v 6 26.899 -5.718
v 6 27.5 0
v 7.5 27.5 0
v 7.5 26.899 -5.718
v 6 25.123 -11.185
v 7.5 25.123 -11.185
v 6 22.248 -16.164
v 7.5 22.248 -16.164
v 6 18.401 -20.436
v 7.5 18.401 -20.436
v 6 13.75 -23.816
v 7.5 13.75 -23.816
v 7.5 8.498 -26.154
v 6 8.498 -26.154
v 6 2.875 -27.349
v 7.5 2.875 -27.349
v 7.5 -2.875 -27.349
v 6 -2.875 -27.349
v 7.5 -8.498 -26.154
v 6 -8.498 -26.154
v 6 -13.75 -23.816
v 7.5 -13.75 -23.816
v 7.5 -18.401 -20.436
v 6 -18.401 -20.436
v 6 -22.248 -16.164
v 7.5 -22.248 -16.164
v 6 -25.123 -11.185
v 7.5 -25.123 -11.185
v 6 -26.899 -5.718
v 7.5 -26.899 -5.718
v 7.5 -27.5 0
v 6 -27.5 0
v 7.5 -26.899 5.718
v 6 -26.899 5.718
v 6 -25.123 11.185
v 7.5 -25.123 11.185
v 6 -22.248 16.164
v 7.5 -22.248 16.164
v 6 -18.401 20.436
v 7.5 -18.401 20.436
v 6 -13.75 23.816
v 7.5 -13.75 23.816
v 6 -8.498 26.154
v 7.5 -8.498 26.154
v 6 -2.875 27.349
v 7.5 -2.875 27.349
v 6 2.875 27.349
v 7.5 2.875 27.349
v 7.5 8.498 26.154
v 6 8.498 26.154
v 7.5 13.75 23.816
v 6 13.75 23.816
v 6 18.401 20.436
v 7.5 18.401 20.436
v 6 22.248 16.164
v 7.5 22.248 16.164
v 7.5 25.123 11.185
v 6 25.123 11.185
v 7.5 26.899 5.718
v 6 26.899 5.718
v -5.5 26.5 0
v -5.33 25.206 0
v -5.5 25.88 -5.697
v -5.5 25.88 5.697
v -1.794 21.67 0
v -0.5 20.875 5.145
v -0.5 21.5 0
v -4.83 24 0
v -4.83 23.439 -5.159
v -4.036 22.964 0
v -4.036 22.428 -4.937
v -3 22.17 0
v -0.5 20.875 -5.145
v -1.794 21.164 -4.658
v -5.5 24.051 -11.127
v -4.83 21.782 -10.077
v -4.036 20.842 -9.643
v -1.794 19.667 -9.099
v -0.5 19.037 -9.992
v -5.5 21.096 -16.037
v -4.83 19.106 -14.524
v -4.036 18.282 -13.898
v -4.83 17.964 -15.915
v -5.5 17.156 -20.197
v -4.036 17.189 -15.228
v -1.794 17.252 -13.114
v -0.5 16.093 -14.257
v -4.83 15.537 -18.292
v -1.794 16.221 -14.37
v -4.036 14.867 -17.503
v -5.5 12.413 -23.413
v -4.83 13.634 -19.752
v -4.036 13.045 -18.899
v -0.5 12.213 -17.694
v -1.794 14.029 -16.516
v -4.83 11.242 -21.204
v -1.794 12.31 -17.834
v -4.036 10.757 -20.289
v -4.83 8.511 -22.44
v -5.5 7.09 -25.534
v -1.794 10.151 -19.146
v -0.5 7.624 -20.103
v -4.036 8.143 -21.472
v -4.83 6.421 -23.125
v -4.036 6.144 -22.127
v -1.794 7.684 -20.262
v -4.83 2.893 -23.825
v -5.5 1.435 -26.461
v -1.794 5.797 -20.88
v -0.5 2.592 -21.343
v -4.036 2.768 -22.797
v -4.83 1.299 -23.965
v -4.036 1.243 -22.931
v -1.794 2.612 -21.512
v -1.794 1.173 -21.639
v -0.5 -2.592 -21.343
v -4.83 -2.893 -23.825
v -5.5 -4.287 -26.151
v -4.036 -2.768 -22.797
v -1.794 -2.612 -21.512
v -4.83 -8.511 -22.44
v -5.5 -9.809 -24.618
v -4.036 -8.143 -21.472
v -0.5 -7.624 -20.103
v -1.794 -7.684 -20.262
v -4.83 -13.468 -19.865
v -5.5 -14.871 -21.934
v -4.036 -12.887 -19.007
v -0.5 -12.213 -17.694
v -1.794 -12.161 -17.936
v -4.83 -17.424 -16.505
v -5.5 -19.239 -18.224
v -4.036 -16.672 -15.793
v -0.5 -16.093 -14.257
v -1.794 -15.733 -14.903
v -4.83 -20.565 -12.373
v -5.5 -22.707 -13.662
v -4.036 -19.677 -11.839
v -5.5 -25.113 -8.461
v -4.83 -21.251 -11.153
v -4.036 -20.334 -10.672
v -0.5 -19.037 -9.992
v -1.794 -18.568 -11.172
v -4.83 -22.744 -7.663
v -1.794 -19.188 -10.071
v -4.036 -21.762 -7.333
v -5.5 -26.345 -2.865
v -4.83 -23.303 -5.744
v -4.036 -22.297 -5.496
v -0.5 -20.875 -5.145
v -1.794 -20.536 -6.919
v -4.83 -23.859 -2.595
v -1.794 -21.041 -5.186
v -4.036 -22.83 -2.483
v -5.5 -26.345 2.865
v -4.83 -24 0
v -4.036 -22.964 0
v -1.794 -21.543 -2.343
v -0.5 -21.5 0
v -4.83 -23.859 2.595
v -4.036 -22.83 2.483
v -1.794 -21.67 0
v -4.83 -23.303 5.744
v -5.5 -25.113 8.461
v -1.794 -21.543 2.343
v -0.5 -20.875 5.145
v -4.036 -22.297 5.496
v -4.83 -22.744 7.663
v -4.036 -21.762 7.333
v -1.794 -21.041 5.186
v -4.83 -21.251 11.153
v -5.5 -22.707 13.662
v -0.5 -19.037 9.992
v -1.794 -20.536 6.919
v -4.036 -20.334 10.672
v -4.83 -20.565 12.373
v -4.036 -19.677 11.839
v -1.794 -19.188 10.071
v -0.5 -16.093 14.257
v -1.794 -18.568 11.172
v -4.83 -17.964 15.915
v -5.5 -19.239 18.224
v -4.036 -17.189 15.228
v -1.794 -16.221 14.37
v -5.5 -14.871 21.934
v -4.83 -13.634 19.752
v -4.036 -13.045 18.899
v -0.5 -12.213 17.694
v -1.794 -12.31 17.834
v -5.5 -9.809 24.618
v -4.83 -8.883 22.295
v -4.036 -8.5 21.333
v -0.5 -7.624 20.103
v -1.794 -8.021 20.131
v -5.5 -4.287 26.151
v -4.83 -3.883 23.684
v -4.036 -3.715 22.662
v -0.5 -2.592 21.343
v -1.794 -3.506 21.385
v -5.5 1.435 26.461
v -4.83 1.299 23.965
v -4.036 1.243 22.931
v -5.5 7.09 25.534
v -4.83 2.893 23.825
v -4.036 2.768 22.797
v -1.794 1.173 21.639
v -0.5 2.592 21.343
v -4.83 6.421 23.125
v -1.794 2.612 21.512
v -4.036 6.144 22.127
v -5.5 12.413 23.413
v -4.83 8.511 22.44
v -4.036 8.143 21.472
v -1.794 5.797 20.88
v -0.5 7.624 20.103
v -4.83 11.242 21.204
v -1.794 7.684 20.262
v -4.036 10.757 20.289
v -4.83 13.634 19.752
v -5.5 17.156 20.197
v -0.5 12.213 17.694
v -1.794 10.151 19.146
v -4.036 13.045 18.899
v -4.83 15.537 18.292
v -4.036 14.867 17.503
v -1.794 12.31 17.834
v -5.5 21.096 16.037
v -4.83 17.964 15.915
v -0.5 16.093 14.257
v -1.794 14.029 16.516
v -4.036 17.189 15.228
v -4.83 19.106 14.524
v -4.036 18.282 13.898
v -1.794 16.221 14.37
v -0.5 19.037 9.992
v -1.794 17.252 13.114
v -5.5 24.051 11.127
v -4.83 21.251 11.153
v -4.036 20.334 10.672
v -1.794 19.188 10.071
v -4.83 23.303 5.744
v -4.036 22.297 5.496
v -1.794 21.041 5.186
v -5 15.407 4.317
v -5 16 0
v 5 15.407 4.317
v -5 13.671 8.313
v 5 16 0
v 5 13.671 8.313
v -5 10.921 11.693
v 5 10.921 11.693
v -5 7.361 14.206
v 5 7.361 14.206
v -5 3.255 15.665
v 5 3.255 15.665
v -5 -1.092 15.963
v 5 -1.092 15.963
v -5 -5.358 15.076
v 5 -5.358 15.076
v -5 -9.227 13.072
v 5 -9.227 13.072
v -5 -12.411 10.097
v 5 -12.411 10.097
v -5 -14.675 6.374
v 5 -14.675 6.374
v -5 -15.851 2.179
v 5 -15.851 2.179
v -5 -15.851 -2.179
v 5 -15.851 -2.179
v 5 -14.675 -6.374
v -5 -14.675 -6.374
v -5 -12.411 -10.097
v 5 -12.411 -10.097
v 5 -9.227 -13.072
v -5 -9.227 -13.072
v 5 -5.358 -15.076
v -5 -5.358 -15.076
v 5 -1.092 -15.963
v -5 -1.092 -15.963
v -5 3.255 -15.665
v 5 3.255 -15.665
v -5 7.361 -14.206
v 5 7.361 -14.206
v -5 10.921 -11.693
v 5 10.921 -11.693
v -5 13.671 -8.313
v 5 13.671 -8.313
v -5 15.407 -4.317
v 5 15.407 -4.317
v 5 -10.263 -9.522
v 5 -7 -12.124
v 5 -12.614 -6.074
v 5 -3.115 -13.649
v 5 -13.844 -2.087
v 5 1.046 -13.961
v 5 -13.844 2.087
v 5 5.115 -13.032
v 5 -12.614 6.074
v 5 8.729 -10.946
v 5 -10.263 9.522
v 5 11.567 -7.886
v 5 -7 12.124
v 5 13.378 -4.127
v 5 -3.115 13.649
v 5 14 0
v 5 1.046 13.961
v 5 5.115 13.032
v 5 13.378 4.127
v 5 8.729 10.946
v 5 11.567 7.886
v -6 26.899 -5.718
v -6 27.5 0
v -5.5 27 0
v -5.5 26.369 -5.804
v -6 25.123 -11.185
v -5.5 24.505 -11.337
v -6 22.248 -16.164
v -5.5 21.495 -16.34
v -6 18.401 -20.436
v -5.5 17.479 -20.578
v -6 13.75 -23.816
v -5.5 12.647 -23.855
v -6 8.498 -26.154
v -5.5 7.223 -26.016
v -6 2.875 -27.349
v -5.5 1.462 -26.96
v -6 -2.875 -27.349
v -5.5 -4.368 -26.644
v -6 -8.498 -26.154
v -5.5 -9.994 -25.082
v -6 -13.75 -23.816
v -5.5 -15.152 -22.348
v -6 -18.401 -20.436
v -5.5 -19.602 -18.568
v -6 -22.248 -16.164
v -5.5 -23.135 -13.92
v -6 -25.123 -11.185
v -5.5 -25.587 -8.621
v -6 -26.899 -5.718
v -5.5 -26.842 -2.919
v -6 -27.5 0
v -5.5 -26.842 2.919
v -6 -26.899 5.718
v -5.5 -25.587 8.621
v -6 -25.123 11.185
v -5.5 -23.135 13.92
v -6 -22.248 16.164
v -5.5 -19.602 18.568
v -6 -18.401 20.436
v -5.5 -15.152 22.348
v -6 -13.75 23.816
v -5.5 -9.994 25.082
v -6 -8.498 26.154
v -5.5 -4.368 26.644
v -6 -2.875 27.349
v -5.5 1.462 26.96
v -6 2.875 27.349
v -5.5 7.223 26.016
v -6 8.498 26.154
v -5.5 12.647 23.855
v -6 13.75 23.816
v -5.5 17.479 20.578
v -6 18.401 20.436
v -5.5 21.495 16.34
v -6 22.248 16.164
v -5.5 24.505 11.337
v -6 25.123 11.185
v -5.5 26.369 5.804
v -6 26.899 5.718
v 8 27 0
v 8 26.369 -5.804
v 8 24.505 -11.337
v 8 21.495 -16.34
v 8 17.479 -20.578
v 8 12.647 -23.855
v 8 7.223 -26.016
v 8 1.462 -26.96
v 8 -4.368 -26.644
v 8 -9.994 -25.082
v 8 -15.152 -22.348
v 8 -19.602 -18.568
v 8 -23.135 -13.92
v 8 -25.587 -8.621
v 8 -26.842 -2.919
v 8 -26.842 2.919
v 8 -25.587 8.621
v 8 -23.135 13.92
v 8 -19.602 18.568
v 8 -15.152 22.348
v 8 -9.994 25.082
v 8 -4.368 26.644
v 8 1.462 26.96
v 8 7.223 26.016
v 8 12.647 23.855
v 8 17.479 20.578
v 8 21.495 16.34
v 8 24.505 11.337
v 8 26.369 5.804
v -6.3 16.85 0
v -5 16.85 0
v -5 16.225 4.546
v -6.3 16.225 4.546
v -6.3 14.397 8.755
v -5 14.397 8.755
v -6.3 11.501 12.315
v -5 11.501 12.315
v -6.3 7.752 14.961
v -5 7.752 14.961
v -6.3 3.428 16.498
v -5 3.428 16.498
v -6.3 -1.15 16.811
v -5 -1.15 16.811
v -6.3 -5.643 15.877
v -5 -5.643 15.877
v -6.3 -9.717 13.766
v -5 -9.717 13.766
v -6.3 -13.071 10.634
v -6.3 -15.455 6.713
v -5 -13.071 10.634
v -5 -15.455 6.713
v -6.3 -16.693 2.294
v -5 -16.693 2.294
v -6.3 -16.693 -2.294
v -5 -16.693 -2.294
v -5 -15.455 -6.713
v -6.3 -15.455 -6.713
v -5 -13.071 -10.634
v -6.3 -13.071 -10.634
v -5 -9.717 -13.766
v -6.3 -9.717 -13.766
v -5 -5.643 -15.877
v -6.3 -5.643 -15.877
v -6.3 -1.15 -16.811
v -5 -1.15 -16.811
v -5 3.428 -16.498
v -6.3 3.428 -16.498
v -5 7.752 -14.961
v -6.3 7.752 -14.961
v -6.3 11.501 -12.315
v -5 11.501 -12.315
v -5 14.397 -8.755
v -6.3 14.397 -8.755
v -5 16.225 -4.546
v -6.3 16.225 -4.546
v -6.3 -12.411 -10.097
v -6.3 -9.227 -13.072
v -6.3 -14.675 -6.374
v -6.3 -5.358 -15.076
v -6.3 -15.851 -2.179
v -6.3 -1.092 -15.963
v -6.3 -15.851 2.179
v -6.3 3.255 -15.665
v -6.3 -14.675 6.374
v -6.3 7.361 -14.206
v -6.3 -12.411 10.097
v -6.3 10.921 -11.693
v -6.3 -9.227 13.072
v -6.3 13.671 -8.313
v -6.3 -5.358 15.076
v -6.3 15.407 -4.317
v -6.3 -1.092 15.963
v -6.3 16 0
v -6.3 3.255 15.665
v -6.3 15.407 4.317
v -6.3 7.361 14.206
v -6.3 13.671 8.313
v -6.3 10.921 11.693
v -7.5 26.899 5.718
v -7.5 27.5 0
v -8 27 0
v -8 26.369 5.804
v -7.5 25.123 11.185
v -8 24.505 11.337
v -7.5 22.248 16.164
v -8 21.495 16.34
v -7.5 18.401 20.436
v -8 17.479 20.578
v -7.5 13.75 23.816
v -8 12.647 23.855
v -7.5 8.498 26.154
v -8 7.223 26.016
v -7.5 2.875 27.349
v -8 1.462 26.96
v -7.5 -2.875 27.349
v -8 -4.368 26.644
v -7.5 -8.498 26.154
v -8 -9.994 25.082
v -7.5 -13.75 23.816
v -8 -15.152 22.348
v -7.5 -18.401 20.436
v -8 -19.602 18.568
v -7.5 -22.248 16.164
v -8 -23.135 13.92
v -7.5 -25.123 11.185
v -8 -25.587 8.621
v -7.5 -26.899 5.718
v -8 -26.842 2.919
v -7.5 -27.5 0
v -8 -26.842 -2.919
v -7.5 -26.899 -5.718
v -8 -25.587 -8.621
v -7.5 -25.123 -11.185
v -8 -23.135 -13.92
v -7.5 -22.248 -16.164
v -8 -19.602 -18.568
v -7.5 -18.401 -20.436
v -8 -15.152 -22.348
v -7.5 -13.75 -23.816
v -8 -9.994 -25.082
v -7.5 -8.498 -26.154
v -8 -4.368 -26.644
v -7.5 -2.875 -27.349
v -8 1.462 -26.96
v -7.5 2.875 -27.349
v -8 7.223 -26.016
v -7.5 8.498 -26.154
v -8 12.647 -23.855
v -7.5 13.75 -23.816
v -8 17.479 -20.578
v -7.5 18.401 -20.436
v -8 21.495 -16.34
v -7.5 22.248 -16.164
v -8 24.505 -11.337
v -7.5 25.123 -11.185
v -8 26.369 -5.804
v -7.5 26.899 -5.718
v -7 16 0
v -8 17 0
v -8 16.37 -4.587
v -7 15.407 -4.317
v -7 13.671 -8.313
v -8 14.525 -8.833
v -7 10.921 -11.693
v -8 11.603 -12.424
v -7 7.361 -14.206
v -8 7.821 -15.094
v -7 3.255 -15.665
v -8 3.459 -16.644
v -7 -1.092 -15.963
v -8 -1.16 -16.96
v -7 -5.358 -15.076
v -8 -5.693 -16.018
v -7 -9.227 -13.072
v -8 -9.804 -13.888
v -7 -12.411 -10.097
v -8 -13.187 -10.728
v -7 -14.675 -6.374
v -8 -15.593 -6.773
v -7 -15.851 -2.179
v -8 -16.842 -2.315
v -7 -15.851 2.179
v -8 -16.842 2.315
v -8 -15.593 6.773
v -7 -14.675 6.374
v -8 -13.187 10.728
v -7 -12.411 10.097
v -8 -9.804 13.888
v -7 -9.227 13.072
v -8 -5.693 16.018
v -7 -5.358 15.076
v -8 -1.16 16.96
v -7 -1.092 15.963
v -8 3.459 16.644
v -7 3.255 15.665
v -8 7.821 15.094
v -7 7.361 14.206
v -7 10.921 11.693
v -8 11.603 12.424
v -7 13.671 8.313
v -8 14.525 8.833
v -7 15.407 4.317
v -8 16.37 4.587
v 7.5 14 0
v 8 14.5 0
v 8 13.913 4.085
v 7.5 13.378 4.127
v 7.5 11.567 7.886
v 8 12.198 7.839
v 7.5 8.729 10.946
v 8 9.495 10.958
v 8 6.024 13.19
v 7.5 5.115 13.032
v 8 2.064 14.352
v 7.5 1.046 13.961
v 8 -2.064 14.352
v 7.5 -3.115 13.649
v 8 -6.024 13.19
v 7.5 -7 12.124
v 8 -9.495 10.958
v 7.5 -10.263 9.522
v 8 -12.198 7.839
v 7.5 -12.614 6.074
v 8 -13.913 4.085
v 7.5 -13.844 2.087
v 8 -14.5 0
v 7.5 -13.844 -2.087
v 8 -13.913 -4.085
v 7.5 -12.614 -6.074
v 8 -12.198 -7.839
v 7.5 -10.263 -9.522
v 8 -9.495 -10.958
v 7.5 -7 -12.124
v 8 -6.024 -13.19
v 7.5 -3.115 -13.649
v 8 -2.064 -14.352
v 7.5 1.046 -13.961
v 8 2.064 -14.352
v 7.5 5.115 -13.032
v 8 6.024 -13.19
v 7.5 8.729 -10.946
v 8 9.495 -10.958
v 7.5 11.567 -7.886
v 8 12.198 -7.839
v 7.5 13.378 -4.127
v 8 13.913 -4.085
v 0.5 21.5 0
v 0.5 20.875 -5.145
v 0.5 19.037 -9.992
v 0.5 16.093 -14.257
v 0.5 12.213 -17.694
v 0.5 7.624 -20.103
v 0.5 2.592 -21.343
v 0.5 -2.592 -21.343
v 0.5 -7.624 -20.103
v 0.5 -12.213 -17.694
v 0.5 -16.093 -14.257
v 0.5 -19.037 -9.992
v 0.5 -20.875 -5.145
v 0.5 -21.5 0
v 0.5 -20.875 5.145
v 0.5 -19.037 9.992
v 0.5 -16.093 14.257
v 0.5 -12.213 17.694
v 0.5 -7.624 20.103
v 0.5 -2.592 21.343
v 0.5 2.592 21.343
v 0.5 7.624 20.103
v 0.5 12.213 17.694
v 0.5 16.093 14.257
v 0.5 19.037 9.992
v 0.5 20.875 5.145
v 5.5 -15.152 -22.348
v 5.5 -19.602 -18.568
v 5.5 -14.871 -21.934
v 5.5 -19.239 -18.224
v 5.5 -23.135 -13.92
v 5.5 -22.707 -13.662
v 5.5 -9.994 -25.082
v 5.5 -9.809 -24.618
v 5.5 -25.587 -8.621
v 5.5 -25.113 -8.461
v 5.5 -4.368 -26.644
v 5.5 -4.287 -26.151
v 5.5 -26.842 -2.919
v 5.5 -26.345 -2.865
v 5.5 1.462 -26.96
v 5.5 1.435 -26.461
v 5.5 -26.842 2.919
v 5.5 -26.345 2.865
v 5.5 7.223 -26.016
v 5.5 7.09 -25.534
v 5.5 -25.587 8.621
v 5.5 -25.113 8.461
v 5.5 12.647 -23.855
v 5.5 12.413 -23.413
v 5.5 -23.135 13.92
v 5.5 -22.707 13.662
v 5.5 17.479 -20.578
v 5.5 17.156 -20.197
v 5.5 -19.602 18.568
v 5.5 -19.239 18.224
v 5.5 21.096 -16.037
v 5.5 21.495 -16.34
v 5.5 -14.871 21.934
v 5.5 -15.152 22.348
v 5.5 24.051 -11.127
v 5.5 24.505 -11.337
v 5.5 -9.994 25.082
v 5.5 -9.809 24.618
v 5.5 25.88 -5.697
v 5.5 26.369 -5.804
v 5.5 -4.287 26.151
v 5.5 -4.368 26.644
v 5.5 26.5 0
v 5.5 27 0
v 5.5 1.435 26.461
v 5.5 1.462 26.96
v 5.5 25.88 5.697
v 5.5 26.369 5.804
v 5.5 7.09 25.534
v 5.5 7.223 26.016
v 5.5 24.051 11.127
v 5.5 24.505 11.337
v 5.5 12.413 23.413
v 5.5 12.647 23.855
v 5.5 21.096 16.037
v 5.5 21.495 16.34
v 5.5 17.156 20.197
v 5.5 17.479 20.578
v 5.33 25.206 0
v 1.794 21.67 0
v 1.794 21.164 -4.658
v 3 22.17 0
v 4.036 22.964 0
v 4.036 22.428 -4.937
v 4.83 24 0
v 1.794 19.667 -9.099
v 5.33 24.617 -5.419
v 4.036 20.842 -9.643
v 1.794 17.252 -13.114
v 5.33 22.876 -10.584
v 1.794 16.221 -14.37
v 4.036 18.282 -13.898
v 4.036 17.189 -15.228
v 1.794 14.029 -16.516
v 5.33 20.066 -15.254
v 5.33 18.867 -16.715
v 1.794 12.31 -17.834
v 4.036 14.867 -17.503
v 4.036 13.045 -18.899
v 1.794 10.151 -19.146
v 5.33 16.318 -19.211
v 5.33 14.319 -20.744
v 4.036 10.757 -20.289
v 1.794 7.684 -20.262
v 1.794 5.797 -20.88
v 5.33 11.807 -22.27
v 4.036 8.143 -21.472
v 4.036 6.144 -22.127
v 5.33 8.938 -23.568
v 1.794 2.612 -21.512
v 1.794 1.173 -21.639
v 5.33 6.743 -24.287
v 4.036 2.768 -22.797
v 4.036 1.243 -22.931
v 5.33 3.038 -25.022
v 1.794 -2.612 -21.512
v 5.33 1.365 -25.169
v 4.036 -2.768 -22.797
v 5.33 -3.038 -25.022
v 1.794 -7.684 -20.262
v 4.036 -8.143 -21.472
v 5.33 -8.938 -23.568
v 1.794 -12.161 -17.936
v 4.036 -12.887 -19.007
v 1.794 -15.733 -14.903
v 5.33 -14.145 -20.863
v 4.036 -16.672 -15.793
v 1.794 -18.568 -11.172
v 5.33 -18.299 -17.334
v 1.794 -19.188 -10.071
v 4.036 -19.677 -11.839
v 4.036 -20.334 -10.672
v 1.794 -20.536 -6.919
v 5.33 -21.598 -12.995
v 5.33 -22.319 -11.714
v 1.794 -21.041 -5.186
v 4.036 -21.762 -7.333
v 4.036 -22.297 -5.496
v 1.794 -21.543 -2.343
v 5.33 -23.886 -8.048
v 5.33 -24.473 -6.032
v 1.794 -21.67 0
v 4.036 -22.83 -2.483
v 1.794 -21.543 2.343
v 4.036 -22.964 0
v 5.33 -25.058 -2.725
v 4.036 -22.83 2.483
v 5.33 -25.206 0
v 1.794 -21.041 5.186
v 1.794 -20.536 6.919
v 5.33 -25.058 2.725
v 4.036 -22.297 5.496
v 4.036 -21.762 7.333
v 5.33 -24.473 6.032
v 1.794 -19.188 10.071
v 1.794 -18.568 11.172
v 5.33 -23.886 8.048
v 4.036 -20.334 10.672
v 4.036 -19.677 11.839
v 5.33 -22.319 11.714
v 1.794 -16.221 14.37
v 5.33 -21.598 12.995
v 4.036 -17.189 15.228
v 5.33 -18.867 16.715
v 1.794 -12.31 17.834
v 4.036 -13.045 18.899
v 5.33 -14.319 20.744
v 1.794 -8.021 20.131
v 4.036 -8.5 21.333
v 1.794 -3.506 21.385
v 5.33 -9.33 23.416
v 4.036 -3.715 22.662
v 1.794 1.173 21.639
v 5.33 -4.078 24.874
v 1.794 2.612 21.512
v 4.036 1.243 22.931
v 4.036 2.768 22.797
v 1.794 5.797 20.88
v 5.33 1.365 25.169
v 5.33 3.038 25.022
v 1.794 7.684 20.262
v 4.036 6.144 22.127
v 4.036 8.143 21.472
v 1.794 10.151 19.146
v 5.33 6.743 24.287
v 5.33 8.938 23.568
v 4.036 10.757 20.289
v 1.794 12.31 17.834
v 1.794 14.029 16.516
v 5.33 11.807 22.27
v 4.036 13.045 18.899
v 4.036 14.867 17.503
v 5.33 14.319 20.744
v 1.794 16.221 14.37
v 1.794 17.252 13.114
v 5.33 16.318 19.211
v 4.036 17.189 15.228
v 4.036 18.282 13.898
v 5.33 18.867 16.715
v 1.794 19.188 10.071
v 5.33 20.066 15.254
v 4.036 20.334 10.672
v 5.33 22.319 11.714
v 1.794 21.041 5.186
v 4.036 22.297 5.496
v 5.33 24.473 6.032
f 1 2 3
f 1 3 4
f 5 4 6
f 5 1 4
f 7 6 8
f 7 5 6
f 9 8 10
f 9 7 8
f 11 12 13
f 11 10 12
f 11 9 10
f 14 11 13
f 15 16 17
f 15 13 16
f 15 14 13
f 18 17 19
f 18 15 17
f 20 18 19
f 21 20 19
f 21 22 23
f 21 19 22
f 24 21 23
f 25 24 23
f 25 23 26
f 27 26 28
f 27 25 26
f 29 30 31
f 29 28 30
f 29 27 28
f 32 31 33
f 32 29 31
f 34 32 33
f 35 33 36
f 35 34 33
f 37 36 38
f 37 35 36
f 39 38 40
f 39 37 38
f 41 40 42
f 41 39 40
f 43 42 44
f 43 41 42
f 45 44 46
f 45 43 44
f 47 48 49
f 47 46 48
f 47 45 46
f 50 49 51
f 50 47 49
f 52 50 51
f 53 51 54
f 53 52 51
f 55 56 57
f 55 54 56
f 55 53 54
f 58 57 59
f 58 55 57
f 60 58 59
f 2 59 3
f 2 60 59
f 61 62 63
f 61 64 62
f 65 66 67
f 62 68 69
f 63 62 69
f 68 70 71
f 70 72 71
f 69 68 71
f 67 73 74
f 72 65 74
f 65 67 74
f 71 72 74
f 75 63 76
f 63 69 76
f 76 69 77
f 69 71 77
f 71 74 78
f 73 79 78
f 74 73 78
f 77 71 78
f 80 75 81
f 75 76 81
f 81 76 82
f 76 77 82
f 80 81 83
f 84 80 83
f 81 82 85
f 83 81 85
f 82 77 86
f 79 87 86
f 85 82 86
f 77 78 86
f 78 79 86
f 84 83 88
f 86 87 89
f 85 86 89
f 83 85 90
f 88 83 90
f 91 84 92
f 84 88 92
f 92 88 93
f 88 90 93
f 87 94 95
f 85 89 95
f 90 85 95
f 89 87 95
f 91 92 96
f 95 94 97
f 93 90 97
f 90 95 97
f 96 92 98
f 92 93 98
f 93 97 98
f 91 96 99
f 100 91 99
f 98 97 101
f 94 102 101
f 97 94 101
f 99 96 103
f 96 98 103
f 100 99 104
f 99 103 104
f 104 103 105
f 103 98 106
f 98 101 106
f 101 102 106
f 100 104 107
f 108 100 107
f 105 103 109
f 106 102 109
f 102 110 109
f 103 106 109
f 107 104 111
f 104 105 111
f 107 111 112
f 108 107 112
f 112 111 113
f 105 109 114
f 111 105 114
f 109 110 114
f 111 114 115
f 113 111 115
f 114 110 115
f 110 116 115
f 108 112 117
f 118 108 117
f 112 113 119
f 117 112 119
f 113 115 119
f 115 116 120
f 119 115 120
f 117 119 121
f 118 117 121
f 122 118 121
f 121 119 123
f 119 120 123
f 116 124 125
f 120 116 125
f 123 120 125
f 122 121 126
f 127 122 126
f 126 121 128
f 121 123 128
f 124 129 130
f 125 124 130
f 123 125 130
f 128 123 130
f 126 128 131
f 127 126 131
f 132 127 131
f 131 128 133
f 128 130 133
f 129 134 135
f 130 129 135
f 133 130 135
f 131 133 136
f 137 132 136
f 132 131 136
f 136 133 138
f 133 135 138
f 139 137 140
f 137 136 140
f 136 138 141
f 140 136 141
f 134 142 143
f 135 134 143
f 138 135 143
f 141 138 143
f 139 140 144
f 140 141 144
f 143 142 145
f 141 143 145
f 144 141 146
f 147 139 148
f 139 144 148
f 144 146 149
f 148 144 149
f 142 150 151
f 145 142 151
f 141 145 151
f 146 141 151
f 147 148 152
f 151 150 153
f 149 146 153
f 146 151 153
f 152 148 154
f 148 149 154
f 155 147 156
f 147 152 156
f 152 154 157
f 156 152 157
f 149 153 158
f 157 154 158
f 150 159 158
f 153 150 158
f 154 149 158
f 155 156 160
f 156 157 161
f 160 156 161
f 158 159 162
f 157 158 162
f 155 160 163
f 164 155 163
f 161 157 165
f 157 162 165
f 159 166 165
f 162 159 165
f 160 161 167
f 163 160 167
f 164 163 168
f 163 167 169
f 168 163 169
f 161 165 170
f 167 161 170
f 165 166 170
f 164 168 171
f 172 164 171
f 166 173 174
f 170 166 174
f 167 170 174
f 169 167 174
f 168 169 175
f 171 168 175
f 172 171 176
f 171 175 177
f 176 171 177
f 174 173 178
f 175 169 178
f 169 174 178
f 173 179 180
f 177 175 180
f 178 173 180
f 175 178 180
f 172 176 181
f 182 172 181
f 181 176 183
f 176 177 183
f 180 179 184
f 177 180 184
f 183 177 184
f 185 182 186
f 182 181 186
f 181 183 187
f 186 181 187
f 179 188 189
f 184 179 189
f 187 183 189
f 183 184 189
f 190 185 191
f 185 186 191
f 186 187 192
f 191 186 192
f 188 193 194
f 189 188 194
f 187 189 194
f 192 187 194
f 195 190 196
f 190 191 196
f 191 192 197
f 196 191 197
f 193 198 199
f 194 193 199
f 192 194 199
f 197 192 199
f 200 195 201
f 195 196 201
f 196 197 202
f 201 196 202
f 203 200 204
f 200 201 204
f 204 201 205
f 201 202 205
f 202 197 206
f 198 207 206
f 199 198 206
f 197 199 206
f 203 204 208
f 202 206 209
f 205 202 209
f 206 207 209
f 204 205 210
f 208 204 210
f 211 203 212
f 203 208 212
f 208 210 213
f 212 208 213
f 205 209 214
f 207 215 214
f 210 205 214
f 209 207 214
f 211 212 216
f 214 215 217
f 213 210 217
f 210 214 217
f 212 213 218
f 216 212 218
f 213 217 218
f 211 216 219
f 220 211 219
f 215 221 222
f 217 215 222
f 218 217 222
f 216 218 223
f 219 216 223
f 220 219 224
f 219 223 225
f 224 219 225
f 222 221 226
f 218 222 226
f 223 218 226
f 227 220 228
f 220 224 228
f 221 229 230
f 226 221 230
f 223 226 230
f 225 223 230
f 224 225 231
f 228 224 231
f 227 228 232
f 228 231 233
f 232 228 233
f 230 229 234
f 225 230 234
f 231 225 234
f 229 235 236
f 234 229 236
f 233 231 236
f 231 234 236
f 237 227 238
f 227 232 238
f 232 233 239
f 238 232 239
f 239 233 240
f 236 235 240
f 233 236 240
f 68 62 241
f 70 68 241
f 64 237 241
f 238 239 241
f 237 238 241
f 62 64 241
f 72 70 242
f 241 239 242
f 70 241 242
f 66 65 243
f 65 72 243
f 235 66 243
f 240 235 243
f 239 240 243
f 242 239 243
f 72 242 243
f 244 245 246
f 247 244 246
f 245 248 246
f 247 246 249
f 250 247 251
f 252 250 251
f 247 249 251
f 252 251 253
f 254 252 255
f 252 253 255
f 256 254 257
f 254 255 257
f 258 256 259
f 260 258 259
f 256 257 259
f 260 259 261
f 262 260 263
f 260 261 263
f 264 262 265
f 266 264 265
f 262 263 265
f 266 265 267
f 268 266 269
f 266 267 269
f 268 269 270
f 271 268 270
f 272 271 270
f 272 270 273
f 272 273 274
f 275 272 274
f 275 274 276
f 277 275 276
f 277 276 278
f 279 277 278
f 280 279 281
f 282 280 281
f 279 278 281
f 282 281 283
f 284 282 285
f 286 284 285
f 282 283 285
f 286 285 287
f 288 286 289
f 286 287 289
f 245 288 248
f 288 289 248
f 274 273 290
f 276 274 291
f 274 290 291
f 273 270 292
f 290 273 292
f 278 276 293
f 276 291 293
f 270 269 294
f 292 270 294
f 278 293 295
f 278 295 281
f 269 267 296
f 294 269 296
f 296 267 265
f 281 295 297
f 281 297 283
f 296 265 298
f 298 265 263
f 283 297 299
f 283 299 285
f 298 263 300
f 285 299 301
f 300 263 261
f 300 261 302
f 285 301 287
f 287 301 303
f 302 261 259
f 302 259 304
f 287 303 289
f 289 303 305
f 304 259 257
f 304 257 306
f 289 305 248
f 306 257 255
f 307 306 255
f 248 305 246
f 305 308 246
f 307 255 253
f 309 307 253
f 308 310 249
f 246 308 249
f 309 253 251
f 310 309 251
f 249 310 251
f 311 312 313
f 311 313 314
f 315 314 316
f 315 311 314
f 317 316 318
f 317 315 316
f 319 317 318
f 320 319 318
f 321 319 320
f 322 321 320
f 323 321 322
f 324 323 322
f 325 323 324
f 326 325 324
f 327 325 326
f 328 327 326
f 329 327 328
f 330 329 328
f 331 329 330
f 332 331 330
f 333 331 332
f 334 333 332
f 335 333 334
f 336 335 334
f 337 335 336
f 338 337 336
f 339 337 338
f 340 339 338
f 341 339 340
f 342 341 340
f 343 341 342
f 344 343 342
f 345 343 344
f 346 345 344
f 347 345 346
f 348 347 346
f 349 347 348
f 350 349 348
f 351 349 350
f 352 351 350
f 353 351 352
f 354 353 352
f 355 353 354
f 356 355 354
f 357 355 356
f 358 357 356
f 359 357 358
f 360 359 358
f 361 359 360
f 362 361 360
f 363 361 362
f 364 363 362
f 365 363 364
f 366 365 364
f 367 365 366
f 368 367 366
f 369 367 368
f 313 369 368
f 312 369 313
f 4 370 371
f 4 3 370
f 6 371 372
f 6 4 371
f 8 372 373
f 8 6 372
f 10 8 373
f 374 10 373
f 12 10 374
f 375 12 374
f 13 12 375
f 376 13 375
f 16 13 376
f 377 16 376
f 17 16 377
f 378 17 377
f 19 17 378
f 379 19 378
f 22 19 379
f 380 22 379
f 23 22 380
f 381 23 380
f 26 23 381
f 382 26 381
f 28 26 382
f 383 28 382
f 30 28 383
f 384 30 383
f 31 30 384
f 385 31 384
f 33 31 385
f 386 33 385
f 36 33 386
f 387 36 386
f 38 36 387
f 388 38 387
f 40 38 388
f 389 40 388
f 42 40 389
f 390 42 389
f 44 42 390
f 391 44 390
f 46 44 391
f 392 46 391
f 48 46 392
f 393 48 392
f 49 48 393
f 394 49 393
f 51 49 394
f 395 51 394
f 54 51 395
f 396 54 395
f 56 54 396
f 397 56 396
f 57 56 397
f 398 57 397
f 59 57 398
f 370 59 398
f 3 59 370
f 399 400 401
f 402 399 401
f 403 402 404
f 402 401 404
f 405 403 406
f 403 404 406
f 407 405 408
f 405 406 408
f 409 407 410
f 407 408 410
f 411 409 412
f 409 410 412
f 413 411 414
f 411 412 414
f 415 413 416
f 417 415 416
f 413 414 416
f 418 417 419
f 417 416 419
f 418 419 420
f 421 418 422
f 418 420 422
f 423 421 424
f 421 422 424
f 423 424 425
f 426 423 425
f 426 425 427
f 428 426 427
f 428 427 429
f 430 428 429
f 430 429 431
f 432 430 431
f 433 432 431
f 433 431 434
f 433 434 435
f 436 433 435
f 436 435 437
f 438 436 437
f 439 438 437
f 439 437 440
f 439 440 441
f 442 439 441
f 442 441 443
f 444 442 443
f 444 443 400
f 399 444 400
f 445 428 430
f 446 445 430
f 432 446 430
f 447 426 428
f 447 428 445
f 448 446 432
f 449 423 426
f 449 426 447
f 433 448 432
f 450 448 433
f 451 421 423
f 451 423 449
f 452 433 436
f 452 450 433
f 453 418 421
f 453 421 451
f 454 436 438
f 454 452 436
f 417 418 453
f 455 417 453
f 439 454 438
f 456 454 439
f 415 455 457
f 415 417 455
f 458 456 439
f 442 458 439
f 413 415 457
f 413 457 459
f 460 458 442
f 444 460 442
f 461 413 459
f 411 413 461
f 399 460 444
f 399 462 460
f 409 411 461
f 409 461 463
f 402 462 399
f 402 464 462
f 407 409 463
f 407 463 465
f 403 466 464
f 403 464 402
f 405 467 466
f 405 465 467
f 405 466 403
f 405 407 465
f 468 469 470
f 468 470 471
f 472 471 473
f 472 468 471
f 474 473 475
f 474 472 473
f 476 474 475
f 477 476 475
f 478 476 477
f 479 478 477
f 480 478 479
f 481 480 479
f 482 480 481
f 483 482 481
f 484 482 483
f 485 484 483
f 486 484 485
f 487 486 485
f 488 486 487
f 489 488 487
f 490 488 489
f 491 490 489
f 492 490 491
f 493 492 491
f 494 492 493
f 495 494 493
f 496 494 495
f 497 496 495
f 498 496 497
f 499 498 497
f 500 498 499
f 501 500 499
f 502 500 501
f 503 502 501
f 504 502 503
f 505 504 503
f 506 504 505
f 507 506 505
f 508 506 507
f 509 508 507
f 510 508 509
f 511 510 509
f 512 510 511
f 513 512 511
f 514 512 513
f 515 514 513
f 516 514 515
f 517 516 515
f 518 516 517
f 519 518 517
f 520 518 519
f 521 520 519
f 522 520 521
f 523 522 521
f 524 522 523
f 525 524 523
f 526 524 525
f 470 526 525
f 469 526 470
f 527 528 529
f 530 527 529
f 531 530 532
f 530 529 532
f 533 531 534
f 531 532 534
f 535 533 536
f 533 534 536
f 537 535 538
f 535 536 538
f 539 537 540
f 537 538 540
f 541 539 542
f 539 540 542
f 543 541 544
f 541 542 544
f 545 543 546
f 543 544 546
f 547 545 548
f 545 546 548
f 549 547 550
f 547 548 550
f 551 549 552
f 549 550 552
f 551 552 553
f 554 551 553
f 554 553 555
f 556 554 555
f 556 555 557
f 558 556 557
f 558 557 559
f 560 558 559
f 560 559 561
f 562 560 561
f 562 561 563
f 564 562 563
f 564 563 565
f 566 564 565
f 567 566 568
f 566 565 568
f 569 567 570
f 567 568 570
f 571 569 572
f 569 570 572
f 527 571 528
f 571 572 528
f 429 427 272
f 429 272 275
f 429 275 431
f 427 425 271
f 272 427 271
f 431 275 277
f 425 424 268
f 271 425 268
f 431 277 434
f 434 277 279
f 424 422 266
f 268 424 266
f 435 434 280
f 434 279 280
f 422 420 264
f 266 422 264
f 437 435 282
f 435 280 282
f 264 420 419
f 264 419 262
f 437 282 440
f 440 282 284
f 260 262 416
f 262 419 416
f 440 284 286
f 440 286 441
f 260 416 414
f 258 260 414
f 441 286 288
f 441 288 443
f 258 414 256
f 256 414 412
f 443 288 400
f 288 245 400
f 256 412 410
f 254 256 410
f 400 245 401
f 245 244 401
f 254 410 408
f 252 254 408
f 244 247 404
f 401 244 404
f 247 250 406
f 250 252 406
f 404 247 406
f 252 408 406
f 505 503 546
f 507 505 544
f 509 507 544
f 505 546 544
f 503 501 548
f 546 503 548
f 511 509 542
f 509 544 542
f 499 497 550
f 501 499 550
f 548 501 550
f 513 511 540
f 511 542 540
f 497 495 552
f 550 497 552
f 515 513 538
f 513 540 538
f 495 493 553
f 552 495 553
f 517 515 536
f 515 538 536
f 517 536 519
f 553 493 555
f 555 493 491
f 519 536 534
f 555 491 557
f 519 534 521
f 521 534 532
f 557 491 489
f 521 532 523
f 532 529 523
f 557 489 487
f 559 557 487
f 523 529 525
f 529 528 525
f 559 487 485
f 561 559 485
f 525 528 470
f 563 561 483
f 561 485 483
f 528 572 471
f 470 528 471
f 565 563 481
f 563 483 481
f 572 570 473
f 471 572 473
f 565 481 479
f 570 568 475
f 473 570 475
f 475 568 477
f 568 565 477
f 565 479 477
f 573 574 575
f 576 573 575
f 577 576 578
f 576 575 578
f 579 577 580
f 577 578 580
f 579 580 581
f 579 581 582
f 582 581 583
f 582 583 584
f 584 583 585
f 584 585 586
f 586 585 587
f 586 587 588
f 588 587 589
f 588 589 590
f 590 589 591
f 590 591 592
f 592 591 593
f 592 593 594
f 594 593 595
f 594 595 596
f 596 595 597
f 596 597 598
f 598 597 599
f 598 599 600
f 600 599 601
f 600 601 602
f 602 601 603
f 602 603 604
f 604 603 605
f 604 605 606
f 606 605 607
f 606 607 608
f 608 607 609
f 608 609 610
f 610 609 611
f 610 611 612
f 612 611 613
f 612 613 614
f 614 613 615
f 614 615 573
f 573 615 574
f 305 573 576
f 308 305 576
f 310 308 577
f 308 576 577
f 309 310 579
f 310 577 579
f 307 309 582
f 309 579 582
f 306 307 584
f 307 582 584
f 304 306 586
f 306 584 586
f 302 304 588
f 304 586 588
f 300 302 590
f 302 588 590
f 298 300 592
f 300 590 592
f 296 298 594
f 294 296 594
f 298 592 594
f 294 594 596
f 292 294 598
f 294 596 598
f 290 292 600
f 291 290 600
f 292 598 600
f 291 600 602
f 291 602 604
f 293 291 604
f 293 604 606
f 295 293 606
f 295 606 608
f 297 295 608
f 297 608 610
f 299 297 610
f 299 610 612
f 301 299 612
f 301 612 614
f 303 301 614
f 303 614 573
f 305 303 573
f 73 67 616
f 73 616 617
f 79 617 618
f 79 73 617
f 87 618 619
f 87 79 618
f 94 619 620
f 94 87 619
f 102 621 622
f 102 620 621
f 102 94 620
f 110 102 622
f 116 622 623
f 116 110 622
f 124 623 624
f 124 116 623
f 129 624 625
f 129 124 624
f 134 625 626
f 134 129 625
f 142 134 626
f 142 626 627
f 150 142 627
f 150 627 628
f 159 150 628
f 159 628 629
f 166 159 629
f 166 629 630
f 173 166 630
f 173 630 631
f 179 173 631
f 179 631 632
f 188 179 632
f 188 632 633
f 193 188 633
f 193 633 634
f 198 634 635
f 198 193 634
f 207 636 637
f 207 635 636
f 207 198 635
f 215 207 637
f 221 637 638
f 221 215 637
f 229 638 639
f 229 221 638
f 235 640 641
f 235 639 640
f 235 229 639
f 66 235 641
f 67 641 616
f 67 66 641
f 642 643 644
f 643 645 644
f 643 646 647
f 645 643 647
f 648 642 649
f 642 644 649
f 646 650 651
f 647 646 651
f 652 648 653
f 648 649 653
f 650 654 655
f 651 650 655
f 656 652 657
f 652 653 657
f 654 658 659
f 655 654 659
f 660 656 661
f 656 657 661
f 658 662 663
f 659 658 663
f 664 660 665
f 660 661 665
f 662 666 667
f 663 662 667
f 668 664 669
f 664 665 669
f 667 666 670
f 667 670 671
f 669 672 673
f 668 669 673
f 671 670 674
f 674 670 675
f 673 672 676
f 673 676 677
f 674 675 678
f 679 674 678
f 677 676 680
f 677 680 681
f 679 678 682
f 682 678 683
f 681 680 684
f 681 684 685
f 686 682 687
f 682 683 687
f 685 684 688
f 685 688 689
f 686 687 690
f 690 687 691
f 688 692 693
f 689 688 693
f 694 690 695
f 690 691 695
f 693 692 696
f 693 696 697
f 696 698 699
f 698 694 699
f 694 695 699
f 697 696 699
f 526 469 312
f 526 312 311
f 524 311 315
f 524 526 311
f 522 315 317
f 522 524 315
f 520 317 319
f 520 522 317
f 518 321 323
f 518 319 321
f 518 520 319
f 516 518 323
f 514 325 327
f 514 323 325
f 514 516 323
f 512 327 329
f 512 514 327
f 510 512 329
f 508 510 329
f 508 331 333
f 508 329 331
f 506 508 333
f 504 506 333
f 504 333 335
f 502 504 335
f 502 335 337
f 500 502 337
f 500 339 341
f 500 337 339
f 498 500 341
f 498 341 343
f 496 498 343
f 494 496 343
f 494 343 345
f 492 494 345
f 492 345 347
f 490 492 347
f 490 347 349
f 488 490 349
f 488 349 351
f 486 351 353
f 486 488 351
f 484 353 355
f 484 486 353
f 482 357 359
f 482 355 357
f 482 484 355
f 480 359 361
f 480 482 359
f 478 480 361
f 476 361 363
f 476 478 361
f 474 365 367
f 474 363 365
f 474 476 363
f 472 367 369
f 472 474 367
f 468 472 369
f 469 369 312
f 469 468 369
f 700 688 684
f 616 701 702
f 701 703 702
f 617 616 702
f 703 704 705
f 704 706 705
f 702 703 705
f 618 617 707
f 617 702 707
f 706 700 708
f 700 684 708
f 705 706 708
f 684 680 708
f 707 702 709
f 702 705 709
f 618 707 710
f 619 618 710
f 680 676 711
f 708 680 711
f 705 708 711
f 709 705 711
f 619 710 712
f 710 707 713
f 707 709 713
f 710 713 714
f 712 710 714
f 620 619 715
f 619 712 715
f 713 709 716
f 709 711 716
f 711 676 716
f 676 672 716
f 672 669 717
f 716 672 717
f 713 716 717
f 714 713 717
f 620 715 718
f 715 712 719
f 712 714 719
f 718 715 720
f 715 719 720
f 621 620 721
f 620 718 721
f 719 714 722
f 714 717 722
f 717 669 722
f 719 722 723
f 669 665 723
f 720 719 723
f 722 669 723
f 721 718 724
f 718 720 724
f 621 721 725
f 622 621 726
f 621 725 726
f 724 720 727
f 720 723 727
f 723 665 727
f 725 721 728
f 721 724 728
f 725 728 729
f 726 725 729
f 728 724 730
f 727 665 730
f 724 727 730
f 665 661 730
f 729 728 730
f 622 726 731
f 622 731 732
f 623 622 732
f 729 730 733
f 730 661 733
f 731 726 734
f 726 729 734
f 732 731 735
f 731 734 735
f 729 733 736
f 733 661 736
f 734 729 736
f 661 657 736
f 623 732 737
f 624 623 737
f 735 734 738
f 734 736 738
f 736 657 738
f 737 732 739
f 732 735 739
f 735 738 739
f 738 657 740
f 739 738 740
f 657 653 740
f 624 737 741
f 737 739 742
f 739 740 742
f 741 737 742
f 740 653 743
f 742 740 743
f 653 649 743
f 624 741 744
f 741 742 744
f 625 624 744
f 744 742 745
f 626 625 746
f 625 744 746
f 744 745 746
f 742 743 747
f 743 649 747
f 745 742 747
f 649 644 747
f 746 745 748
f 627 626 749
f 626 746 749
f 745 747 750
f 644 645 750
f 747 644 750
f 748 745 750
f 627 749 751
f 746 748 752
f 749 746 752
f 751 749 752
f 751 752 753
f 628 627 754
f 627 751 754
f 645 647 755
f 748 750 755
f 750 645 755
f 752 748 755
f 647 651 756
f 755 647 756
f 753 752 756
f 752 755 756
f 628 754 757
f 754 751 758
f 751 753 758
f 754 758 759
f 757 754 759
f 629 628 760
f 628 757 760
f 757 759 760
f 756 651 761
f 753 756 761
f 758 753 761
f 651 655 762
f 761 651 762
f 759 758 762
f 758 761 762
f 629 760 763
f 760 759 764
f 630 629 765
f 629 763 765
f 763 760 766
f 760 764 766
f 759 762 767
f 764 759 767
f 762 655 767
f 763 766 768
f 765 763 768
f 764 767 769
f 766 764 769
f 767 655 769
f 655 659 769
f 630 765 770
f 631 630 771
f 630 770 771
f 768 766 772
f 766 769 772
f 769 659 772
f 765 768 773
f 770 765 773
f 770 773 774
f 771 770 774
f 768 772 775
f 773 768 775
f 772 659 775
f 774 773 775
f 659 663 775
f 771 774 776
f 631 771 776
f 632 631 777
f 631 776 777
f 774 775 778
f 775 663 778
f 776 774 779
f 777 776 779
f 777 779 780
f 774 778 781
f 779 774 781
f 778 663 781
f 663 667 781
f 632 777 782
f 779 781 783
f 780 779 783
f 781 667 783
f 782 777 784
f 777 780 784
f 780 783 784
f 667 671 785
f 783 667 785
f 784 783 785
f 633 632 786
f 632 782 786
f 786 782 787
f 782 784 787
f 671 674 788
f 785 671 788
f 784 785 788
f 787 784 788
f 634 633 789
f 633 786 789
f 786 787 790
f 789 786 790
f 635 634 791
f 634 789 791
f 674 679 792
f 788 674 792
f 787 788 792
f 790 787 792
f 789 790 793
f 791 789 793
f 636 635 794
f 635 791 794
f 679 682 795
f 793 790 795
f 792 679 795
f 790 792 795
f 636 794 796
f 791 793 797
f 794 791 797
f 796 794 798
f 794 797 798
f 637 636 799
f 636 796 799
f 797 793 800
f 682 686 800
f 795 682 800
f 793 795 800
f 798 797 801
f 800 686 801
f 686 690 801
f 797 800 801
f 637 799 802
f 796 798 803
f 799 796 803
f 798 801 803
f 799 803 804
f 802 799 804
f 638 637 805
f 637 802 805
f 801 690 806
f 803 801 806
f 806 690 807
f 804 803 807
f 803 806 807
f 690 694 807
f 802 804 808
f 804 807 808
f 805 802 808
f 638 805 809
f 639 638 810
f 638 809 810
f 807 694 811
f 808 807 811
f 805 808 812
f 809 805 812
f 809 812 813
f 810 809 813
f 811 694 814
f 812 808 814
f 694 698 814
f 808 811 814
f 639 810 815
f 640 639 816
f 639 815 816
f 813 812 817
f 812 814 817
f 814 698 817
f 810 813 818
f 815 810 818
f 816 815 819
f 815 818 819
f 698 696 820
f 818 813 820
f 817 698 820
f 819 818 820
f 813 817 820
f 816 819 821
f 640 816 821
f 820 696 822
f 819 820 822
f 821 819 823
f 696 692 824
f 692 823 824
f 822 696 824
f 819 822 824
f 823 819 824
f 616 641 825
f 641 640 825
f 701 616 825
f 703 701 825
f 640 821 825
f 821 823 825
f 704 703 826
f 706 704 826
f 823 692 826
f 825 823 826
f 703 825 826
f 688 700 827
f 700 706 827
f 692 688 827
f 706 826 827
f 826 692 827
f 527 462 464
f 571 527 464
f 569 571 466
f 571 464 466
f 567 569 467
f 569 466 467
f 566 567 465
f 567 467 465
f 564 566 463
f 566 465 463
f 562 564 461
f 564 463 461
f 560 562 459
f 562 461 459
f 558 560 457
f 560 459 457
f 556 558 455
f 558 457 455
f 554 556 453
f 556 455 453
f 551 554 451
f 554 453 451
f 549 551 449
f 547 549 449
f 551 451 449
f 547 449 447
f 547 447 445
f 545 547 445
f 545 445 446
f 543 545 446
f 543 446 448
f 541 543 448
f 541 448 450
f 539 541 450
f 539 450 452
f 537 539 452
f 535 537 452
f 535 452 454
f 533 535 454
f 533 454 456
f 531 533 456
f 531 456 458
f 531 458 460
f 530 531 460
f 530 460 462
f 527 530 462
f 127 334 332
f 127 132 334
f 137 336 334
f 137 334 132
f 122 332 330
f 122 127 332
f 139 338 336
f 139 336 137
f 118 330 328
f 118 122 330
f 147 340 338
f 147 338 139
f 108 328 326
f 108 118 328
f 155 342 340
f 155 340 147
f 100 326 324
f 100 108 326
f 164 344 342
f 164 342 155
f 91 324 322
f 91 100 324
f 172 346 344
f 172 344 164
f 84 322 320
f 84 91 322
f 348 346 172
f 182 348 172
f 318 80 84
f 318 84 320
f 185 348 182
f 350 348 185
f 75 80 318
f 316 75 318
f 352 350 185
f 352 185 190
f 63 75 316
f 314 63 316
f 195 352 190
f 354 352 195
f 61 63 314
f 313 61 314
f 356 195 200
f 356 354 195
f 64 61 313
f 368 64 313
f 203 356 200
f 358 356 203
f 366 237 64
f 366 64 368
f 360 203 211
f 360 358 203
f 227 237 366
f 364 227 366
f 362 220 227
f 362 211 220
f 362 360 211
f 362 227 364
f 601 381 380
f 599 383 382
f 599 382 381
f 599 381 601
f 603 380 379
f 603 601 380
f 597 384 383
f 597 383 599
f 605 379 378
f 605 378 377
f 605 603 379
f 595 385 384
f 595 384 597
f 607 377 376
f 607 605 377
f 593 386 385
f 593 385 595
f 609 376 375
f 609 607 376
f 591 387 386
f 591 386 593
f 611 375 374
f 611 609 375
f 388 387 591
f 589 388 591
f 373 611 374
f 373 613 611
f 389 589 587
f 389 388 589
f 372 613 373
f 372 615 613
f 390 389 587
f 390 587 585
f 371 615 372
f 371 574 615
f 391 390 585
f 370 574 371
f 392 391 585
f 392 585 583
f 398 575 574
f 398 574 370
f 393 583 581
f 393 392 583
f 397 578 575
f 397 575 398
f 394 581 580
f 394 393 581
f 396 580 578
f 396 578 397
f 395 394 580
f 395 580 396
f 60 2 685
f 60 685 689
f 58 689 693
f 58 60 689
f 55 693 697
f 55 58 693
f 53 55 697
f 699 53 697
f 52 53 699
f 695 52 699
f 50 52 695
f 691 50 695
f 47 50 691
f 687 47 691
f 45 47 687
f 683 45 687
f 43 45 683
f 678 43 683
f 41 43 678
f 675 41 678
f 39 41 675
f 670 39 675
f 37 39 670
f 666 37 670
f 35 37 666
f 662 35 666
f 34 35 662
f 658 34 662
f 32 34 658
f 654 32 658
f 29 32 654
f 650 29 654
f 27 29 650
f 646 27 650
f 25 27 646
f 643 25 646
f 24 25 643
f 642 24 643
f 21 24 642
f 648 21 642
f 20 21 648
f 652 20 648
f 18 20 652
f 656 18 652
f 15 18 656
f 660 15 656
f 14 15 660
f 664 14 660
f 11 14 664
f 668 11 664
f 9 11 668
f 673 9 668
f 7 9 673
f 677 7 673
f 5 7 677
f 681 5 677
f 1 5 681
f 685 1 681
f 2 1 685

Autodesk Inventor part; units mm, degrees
ref_plane "YZ Plane" through (0, 0, 0) normal (1, 0, 0) x (0, 1, 0)
ref_plane "XZ Plane" through (0, 0, 0) normal (0, 1, 0) x (-1, 0, 0)
ref_plane "XY Plane" through (0, 0, 0) normal (0, 0, 1) x (1, 0, 0)
sketch "Náčrt1" plane through (0, 0, 0) normal (0, 0, 1) x (1, 0, 0)
  line L0 (-8, 0) -> (8, 0)
  line L1 (8, 0) -> (8, 27.5)
  line L2 (8, 27.5) -> (5.5, 27.5)
  line L3 (5.5, 27.5) -> (5.5, 26.5)
  line L4 (0.5, 21.5) -> (-0.5, 21.5)
  line L5 (-5.5, 26.5) -> (-5.5, 27.5)
  line L6 (-5.5, 27.5) -> (-8, 27.5)
  line L7 (-8, 27.5) -> (-8, 0)
  line L8 (-8, 16) -> (-6.3, 16)
  line L9 (-6.3, 16) -> (-6.3, 16.85)
  line L10 (-6.3, 16.85) -> (-5, 16.85)
  line L11 (-5, 16.85) -> (-5, 16)
  line L12 (-5, 16) -> (5, 16)
  line L13 (5, 16) -> (5, 14)
  line L14 (5, 14) -> (8, 14)
  arc A0 (-5.5, 26.5) -> (-0.5, 21.5) centre (-0.5, 26.5) ccw
  arc A1 (0.5, 21.5) -> (5.5, 26.5) centre (0.5, 26.5) ccw
  point P0 (0, 0)
  point P1 (0, 0)
  point P2 (5.5, 21.5)
  point P3 (-5.5, 21.5)
  dimension "d0" = 55
  dimension "d1" = 16
  dimension "d3" = 2.5
  dimension "d4" = 6
  dimension "d5" = 32
  dimension "d6" = 28
  dimension "d7" = 10
  dimension "d8" = 13
  dimension "d9" = 33.7
  dimension "d10" = 1.3
  dimension "d18" = 11
  dimension "d24" = 43
  dimension "d27" = 5
revolve "Rotace1" add sketch "Náčrt1" angle 360 about axis through (-8, 0, 0) along (1, 0, 0) contours L7 L6 L5 A0 L4 A1 L3 L2 L1 L14 L13 L12 L11 L10 L9 L8
chamfer "Zkosení1" distance 1 angle 45 1 edges at (-8, -16, 0)
chamfer "Zkosení2" distance 0.5 angle 45 5 edges at (-8, -27.5, 0) (-5.5, -27.5, 0) (5.5, -27.5, 0) (8, -27.5, 0) (8, -14, 0)
sketch "Náčrt2" plane through (8, 0, 0) normal (1, 0, 0) x (0, 0, -1)
  circle A0 centre (0, 0) radius 27.5 projected
  circle A1 centre (0, 0) radius 14.5 projected
  circle A2 centre (0, 0) radius 30
  dimension "d25" = 2.5
  dimension "d26" = 60
extrude "POLOTOVAR" [suppressed]
properties part number "DD_KVD_004_02" material "Nerezová ocel"
